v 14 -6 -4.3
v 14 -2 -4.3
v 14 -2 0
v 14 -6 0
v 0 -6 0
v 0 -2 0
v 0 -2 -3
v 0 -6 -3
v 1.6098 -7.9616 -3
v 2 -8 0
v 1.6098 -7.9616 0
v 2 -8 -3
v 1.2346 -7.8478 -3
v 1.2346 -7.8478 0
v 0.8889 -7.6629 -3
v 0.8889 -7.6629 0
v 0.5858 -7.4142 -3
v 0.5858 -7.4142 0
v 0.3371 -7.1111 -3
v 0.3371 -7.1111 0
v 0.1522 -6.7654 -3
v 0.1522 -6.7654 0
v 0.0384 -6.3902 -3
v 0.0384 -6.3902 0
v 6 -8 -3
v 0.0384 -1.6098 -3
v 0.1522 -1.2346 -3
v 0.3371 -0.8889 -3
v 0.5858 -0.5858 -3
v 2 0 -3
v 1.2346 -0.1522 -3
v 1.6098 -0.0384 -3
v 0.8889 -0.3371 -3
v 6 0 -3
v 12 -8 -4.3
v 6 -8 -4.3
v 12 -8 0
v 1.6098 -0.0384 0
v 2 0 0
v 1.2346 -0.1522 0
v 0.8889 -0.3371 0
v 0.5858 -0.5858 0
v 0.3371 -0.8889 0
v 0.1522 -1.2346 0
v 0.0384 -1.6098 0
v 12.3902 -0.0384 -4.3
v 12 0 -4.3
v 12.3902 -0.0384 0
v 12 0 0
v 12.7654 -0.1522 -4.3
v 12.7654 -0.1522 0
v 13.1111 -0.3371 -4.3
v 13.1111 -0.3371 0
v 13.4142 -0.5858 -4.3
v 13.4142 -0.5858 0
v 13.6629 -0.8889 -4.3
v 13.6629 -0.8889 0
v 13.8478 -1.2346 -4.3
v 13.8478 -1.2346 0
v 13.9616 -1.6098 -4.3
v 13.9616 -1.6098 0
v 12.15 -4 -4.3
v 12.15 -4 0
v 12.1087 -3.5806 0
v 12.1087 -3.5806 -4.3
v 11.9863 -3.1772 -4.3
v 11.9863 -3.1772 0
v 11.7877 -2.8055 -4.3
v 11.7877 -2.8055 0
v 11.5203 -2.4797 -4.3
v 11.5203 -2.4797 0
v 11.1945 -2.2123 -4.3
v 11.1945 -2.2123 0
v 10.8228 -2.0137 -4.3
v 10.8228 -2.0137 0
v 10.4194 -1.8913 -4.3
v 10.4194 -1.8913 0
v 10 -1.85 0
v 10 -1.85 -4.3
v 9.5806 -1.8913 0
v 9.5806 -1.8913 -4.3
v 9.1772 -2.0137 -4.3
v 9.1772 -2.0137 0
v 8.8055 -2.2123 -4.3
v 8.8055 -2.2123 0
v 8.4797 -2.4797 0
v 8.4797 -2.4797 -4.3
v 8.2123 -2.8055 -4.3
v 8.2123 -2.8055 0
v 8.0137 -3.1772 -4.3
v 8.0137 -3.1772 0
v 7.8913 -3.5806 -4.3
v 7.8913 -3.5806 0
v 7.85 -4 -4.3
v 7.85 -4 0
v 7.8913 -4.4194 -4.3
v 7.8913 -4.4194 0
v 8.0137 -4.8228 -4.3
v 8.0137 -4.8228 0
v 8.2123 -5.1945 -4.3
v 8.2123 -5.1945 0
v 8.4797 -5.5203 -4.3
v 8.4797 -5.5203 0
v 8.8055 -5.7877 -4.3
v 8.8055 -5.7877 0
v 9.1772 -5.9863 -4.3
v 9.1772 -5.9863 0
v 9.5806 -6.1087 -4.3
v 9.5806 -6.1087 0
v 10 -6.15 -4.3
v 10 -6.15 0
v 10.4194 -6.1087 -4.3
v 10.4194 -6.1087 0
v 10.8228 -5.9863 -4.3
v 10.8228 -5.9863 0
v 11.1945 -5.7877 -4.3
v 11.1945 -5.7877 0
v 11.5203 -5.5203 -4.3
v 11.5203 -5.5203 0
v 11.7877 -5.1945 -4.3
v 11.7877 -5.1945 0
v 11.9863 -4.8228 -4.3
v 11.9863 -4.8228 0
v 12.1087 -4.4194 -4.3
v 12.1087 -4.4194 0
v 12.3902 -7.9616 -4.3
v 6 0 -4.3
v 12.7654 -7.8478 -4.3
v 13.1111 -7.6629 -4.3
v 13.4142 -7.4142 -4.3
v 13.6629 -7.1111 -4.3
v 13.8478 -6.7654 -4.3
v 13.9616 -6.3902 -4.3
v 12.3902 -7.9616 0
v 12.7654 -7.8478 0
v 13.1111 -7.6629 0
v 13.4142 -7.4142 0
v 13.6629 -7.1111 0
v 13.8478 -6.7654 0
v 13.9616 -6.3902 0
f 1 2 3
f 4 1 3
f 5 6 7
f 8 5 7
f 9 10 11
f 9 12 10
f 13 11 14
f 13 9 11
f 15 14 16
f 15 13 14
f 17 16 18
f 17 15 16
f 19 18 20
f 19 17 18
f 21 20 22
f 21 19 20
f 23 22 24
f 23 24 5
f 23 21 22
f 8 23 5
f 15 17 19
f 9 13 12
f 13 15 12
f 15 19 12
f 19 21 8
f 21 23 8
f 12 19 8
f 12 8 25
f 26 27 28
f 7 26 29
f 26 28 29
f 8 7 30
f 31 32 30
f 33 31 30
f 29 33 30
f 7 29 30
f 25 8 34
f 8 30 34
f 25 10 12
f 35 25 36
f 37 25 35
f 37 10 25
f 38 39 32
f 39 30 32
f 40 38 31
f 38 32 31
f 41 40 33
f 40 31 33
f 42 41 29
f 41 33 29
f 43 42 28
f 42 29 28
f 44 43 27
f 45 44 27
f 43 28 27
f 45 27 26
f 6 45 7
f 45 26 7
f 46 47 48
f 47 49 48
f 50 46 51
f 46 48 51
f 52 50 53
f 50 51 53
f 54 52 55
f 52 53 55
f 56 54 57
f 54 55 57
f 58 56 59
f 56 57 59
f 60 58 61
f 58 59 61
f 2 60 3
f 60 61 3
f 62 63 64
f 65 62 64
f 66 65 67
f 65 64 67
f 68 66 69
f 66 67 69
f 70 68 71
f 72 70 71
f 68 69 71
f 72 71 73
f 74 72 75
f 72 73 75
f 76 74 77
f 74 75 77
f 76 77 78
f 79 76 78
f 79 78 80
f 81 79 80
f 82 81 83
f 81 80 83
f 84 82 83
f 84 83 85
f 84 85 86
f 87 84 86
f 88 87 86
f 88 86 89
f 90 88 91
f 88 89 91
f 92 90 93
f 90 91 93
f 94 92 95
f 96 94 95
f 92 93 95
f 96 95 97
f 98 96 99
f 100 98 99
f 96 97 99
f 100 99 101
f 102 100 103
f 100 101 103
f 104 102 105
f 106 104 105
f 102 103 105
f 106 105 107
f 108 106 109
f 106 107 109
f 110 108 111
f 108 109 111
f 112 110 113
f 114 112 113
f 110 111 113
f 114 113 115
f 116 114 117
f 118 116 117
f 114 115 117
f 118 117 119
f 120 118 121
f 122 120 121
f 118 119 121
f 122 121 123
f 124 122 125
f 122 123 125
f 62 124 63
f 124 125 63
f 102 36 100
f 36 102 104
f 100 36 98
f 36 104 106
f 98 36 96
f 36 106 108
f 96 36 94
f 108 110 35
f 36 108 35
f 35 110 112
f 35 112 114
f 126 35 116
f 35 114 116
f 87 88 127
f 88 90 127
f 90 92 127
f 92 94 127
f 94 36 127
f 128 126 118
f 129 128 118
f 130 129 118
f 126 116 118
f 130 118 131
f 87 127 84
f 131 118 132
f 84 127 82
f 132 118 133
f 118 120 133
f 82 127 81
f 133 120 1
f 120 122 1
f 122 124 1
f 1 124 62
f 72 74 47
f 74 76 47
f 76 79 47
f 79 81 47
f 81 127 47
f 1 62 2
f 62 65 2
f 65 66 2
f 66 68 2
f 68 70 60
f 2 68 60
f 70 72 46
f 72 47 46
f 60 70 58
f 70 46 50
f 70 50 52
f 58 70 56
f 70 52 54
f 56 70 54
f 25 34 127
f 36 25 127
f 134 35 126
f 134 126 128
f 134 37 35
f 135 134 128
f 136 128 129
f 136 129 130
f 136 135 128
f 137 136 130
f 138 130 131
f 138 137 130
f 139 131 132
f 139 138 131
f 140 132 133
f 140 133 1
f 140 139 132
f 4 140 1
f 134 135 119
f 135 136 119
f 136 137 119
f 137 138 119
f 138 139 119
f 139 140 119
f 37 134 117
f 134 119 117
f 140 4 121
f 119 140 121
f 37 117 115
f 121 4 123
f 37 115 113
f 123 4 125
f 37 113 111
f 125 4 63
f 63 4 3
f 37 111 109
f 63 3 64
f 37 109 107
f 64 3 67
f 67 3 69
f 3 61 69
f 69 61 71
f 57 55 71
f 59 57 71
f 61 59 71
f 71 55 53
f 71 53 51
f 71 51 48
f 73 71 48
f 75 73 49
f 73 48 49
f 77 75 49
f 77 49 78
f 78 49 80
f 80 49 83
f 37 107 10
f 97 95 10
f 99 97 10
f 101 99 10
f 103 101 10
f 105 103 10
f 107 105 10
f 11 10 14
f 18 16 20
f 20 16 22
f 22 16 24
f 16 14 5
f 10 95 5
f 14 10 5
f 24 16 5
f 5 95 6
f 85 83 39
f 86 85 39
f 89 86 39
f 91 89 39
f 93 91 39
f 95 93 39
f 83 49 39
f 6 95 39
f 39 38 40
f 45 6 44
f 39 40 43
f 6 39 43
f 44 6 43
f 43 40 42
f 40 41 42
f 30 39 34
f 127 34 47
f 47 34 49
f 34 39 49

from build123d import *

# Parameters (mm, degrees)
F2_DEPTH = 8
F3_R     = 2.15
F4_DEPTH = 4.3
F5_R     = 2


# Not quite as in the source:
# - a feature names something its author has since deleted; it is built from what else it names


with BuildPart() as f2:
    # F1 (on Front) → F2 (new body)
    with BuildSketch(Plane.XZ):
        Polygon((6, -3), (6, -4.3), (14, -4.3), (14, 0), (0, 0), (0, -3), align=None)
    extrude(amount=F2_DEPTH)

    # F3 (on face) → F4 (cut, through all)
    with BuildSketch(Plane.XY):
        with Locations((10, -4)):
            Circle(F3_R)
    extrude(amount=-F4_DEPTH, mode=Mode.SUBTRACT)

    # F5
    f5_edges = [f2.edges().sort_by_distance(p)[0] for p in [
        (14, -8, -2.15),
        (14, 0, -2.15),
        (0, -8, -1.5),
        (0, 0, -1.5),
    ]]
    fillet(f5_edges, radius=F5_R)


solid = f2.part
